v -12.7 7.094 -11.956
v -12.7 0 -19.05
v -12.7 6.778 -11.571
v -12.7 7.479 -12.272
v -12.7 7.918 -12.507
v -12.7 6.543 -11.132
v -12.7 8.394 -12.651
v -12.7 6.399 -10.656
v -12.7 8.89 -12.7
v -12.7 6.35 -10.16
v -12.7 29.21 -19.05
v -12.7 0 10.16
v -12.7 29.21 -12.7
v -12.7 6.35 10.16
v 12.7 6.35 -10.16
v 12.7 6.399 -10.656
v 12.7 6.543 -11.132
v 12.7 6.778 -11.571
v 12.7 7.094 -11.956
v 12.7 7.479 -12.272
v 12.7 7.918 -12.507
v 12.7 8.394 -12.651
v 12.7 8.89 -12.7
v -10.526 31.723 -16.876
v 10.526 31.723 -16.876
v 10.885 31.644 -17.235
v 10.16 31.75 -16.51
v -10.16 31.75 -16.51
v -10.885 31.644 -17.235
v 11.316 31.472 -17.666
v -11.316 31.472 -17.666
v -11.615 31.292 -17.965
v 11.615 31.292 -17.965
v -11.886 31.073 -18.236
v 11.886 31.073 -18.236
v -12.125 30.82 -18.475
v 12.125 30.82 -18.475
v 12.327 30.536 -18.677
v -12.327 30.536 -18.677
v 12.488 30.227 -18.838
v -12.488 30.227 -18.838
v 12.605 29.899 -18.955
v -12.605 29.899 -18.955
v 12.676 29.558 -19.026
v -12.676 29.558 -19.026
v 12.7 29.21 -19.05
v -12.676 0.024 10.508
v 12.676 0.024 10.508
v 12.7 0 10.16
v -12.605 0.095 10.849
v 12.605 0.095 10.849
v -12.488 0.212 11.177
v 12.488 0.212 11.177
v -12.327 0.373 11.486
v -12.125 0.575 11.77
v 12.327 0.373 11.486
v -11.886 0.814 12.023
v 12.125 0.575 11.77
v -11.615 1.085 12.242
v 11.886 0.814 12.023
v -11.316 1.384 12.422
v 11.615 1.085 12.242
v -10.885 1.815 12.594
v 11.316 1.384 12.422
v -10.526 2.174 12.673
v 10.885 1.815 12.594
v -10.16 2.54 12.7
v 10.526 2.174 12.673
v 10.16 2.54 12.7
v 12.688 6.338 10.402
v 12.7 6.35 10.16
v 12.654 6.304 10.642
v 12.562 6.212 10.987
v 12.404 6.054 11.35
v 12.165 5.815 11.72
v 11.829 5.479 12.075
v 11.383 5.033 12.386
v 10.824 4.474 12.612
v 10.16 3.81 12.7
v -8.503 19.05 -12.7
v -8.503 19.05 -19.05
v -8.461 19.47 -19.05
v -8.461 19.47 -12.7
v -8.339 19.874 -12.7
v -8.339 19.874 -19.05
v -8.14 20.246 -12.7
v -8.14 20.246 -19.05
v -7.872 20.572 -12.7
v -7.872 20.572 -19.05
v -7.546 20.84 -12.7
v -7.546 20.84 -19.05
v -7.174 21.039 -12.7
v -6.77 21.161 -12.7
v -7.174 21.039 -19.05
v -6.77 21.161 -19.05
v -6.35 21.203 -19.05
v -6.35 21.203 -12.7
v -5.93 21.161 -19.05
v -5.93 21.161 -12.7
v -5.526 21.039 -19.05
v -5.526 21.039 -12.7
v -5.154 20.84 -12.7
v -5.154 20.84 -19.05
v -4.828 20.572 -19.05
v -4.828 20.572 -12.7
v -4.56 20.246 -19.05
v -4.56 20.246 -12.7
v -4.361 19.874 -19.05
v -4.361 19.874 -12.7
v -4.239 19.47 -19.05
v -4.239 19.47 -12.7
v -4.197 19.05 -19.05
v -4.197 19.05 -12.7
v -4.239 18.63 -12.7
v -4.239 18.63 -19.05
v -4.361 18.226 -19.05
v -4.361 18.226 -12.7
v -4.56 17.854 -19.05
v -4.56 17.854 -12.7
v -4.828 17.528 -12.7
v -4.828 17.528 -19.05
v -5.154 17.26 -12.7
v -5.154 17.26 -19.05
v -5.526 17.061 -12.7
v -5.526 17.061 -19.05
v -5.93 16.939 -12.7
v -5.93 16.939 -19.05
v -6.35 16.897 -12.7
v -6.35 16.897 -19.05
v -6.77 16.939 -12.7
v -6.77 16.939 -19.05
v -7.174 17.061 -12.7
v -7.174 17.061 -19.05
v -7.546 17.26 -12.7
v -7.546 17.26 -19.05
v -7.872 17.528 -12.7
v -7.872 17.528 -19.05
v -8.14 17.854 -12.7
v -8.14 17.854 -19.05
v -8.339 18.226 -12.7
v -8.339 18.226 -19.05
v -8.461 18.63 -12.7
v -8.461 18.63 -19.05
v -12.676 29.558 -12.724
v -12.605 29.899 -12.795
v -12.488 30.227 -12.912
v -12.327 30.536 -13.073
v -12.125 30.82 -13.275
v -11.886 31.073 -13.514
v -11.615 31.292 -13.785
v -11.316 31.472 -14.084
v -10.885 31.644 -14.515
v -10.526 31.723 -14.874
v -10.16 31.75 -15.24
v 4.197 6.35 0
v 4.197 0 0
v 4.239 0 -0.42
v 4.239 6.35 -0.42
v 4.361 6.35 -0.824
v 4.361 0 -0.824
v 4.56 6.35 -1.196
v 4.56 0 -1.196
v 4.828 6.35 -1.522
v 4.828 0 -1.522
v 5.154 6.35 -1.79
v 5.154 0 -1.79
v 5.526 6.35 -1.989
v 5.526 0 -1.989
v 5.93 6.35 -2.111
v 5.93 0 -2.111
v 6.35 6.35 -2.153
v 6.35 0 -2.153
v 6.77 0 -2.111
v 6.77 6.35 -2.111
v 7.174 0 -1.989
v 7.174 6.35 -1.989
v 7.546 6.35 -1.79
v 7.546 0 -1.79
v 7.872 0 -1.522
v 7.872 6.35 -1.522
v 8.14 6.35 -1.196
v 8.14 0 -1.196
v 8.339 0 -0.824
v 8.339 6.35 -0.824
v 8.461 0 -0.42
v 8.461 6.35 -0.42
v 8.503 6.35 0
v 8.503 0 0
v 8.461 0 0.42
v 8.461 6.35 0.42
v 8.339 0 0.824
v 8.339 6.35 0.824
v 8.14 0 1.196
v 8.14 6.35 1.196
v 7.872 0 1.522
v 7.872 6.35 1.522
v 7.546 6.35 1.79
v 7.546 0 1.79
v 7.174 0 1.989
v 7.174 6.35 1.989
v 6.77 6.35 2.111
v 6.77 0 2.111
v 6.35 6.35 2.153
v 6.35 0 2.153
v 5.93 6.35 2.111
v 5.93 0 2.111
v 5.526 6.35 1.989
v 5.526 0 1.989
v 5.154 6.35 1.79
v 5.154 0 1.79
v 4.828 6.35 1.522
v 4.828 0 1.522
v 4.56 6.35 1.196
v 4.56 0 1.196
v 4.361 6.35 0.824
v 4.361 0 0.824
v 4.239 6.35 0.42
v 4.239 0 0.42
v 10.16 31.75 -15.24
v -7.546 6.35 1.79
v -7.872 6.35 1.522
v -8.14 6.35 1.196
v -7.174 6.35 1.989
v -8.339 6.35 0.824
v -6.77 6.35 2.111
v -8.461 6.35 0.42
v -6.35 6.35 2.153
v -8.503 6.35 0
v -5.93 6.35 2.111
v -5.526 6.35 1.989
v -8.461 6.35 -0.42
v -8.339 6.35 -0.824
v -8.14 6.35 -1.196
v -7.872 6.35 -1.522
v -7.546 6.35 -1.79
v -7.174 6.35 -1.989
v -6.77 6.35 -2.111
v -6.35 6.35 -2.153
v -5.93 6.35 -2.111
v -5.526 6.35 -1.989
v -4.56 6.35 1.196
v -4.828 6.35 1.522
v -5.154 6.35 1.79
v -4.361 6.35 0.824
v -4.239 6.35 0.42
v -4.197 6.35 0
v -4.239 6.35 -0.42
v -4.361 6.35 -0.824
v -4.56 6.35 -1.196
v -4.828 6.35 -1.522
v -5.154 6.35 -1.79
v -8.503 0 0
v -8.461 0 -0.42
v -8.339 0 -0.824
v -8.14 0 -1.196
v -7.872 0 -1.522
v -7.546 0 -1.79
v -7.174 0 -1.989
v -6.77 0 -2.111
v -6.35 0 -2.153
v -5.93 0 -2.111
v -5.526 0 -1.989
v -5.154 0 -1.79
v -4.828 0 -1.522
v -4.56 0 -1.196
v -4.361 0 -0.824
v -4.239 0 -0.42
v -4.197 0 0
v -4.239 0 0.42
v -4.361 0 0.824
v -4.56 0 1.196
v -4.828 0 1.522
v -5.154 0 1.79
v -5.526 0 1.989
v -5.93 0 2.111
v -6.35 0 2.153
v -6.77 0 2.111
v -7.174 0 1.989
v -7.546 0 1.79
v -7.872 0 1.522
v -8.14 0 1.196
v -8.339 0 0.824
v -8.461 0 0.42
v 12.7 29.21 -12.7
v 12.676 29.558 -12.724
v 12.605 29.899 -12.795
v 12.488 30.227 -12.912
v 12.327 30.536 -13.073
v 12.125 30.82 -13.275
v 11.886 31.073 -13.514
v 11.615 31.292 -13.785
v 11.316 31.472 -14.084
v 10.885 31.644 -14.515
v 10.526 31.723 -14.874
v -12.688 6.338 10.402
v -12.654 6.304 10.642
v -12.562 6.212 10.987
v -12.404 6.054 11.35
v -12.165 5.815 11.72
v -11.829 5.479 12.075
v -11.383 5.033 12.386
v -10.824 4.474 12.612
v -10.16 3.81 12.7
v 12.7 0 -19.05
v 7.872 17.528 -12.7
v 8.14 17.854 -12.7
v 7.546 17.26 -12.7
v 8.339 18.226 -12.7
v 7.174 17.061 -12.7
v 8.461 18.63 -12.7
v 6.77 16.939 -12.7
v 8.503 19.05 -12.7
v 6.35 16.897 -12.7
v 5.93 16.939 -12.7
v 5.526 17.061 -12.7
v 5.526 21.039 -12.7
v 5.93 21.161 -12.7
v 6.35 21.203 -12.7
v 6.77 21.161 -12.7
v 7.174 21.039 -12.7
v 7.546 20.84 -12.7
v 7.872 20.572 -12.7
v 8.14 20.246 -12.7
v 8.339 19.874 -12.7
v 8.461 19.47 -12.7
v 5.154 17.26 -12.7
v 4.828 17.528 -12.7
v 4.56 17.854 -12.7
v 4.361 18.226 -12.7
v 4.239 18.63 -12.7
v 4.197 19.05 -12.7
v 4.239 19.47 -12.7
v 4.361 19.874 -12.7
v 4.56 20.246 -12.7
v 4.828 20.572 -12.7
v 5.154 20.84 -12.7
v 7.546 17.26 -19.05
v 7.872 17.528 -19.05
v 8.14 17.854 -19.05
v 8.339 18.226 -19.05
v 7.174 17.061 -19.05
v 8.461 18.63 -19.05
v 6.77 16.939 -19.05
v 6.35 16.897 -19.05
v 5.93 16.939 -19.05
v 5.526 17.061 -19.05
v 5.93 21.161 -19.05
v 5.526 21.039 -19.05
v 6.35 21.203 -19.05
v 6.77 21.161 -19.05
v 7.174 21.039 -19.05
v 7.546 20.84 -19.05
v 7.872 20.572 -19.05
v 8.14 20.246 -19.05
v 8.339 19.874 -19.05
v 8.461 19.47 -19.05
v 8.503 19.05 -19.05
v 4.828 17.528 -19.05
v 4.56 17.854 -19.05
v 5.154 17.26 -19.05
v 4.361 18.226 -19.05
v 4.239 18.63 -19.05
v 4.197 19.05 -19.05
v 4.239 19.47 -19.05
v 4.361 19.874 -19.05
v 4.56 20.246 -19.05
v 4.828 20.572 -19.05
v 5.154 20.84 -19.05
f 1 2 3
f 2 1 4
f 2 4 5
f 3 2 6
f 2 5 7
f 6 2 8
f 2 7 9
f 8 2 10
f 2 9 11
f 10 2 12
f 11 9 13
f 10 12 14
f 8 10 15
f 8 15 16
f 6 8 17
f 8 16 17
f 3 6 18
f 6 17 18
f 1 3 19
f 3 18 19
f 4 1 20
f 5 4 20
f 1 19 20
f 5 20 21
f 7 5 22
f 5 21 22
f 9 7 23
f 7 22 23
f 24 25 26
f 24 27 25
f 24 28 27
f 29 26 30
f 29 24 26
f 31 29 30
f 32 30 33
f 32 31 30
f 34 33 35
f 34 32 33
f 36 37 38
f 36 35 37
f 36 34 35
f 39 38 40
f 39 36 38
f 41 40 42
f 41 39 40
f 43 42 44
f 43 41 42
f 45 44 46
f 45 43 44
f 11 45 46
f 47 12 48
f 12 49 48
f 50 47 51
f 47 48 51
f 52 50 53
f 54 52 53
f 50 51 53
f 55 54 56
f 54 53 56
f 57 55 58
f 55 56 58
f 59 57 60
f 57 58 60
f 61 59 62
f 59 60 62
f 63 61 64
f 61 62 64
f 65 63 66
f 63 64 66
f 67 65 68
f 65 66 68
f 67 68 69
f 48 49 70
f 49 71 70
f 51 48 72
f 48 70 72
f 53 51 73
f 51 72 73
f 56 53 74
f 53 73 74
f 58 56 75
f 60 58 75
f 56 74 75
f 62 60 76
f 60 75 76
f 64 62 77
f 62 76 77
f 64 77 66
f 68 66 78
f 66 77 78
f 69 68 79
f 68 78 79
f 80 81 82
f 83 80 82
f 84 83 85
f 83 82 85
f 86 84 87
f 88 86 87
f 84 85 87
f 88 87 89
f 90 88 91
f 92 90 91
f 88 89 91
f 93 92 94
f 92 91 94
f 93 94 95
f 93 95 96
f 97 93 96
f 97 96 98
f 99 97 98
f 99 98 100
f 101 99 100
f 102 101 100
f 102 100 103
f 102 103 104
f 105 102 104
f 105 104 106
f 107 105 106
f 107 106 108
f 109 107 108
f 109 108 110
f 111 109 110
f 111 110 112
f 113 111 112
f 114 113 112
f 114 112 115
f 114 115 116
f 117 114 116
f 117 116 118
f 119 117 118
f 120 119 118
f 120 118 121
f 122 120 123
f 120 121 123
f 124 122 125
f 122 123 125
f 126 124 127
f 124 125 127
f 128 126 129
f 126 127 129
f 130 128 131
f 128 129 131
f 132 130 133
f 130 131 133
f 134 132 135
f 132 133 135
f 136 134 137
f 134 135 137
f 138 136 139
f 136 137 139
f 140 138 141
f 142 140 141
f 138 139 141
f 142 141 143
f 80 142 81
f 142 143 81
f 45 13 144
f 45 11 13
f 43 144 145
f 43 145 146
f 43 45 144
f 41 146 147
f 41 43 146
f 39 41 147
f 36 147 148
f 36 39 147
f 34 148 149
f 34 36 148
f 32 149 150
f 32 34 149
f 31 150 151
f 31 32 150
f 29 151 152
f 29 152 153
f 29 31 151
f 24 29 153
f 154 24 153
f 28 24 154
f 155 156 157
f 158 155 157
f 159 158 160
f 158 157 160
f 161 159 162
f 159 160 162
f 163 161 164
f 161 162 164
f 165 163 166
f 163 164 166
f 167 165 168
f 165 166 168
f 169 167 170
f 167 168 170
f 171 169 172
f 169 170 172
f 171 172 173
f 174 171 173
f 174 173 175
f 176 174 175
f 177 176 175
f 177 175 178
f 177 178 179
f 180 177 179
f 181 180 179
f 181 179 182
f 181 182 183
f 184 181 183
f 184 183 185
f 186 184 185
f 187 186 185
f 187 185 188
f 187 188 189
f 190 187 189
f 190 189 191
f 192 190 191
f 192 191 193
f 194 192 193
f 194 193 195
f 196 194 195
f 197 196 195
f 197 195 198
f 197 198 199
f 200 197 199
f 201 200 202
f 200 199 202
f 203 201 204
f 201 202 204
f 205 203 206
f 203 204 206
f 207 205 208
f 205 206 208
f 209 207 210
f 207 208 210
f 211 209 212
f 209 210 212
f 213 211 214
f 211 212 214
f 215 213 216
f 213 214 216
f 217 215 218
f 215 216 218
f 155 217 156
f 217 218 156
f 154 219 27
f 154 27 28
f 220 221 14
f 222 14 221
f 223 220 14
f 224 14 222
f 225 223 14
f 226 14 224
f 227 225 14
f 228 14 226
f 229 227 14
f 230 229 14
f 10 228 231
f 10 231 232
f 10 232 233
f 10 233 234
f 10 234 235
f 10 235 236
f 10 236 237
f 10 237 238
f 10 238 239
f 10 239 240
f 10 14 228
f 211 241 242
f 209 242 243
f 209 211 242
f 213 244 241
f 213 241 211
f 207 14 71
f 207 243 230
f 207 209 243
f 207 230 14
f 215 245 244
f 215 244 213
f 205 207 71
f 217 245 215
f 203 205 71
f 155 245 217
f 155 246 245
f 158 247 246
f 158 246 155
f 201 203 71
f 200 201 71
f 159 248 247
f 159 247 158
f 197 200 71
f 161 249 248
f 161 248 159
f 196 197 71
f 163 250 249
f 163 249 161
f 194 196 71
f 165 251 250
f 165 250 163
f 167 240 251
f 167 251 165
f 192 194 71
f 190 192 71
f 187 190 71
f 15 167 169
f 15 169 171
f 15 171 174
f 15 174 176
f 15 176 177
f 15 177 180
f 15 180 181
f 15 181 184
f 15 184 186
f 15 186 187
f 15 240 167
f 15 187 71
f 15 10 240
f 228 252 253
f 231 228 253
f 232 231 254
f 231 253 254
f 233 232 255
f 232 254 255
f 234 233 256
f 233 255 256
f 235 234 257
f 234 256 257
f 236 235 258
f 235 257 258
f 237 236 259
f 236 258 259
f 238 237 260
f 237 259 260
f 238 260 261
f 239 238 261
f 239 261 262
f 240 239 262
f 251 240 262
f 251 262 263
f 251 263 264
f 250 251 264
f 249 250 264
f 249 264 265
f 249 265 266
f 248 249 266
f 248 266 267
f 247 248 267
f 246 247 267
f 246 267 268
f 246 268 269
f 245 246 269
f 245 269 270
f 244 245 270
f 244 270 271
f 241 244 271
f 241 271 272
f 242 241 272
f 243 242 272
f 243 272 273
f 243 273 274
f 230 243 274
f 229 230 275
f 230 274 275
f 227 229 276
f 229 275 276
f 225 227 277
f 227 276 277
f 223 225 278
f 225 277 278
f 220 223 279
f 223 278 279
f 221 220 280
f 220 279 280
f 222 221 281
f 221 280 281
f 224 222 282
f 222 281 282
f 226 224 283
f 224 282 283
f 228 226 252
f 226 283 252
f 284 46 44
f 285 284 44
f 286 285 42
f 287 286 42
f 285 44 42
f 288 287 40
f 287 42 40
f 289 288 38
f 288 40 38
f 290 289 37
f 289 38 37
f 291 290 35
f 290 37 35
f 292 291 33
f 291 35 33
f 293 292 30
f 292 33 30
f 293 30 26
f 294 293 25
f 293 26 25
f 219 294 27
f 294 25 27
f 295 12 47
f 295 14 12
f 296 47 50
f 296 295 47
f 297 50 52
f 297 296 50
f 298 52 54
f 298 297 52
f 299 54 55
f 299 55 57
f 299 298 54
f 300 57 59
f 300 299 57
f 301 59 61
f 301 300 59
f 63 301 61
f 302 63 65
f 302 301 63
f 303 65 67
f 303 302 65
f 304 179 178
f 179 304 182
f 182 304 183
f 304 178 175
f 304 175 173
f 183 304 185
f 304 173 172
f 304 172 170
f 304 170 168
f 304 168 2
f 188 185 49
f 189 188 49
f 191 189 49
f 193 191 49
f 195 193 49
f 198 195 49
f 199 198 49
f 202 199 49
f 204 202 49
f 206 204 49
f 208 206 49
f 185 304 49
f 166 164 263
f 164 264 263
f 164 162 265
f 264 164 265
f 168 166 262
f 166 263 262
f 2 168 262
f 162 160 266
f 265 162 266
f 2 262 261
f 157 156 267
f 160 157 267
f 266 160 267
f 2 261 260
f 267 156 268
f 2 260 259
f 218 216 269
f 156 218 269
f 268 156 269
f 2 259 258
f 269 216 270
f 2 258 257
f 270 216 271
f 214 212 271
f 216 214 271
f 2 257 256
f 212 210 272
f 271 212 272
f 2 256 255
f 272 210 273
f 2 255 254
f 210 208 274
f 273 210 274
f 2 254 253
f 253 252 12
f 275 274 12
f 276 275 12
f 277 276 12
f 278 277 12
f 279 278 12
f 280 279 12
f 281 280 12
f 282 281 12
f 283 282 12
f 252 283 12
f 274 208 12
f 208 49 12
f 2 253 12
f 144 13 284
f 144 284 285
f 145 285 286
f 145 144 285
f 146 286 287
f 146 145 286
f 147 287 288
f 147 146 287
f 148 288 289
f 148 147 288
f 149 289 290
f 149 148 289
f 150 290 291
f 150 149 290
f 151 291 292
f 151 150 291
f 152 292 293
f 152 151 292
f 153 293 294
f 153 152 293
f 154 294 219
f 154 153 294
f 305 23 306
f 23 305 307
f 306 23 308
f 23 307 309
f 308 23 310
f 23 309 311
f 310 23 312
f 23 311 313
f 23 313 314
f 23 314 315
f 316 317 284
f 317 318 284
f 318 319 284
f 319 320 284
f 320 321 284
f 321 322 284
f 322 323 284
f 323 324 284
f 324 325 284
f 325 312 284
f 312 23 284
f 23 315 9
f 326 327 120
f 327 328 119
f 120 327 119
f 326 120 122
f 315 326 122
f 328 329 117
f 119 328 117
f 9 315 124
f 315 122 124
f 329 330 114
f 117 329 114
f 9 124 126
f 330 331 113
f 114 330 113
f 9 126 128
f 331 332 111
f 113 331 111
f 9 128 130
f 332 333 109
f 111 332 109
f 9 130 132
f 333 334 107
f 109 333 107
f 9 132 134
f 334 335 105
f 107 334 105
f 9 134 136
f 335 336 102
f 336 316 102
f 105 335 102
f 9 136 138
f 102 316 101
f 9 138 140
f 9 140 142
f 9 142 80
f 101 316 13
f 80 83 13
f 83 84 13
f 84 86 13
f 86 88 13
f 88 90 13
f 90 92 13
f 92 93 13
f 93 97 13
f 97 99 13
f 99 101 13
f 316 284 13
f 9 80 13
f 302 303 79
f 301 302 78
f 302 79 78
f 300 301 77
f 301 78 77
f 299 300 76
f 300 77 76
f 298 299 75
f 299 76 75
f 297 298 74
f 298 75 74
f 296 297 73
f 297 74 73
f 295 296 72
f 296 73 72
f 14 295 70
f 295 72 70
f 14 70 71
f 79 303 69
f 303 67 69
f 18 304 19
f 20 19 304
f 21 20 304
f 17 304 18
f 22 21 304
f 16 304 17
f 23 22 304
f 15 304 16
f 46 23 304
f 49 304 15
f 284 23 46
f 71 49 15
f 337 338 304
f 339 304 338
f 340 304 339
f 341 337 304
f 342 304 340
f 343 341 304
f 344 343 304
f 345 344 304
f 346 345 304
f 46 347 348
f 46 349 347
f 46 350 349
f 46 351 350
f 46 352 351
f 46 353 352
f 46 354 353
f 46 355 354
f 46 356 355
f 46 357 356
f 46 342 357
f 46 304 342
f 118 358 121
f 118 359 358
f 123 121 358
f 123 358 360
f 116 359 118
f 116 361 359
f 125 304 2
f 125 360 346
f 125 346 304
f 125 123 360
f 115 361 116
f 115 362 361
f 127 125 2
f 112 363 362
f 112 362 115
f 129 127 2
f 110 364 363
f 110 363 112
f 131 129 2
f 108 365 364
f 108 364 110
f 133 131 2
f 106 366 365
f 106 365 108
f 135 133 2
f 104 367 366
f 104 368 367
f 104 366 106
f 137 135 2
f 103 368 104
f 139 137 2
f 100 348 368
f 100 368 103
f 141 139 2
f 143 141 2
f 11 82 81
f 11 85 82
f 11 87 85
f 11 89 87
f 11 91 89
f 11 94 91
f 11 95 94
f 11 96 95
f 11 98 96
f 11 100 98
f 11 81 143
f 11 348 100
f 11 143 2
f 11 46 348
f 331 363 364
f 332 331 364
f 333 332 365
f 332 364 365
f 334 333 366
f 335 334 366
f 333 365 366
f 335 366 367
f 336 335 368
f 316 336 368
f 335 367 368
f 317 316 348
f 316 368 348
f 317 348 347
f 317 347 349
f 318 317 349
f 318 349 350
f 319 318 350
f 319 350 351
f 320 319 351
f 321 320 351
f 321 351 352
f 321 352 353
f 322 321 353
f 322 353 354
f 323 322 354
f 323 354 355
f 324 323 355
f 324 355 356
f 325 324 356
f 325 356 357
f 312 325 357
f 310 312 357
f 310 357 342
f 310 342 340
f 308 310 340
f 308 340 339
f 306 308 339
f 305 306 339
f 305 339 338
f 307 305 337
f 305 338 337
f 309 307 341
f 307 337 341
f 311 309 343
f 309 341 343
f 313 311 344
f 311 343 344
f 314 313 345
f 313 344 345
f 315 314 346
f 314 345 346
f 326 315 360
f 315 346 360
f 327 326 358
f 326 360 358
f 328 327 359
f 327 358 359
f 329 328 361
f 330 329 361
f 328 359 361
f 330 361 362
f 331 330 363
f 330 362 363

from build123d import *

# Parameters (mm, degrees)
SKETCH1_W             = 25.4
SKETCH1_H             = 25.4
BOSS_EXTRUDE1_DEPTH   = 6.35
SKETCH2_W             = 25.4
SKETCH2_H             = 31.75
BOSS_EXTRUDE2_DEPTH   = 6.35
FILLET1_R             = 2.54
F_8_CLEARANCE_HOLE1_D = 4.3053
F_8_CLEARANCE_HOLE2_D = 4.3053


with BuildPart() as part:
    # Sketch1 → Boss-Extrude1 (new body)
    with BuildSketch(Plane(origin=(0, 0, 0), x_dir=(1, 0, 0), z_dir=(0, 1, 0))):
        Rectangle(SKETCH1_W, SKETCH1_H)
    extrude(amount=BOSS_EXTRUDE1_DEPTH)

    # Sketch2 → Boss-Extrude2 (add)
    with BuildSketch(Plane(origin=(0, 0, -12.7), x_dir=(-1, 0, 0), z_dir=(0, 0, -1))):
        with Locations((0, 15.875)):
            Rectangle(SKETCH2_W, SKETCH2_H)
    extrude(amount=BOSS_EXTRUDE2_DEPTH)

    # Fillet1
    fillet1_edges = [part.edges().sort_by_distance(p)[0] for p in [
        (0, 31.75, -12.7),
        (-12.7, 31.75, -15.875),
        (12.7, 31.75, -15.875),
        (0, 6.35, 12.7),
        (0, 31.75, -19.05),
        (0, 0, 12.7),
        (12.7, 3.175, 12.7),
        (-12.7, 3.175, 12.7),
        (0, 6.35, -12.7),
    ]]
    fillet(fillet1_edges, radius=FILLET1_R)

    # #8 Clearance Hole1 (through all)
    with Locations(Plane(origin=(0, 6.35, 0), x_dir=(1, 0, 0), z_dir=(0, 1, 0))):
        with Locations((-6.35, 0), (6.35, 0)):
            Hole(F_8_CLEARANCE_HOLE1_D / 2)

    # #8 Clearance Hole2 (through all)
    with Locations(Plane.XY.offset(-12.7)):
        with Locations((6.35, 19.05), (-6.35, 19.05)):
            Hole(F_8_CLEARANCE_HOLE2_D / 2)


solid = part.part
